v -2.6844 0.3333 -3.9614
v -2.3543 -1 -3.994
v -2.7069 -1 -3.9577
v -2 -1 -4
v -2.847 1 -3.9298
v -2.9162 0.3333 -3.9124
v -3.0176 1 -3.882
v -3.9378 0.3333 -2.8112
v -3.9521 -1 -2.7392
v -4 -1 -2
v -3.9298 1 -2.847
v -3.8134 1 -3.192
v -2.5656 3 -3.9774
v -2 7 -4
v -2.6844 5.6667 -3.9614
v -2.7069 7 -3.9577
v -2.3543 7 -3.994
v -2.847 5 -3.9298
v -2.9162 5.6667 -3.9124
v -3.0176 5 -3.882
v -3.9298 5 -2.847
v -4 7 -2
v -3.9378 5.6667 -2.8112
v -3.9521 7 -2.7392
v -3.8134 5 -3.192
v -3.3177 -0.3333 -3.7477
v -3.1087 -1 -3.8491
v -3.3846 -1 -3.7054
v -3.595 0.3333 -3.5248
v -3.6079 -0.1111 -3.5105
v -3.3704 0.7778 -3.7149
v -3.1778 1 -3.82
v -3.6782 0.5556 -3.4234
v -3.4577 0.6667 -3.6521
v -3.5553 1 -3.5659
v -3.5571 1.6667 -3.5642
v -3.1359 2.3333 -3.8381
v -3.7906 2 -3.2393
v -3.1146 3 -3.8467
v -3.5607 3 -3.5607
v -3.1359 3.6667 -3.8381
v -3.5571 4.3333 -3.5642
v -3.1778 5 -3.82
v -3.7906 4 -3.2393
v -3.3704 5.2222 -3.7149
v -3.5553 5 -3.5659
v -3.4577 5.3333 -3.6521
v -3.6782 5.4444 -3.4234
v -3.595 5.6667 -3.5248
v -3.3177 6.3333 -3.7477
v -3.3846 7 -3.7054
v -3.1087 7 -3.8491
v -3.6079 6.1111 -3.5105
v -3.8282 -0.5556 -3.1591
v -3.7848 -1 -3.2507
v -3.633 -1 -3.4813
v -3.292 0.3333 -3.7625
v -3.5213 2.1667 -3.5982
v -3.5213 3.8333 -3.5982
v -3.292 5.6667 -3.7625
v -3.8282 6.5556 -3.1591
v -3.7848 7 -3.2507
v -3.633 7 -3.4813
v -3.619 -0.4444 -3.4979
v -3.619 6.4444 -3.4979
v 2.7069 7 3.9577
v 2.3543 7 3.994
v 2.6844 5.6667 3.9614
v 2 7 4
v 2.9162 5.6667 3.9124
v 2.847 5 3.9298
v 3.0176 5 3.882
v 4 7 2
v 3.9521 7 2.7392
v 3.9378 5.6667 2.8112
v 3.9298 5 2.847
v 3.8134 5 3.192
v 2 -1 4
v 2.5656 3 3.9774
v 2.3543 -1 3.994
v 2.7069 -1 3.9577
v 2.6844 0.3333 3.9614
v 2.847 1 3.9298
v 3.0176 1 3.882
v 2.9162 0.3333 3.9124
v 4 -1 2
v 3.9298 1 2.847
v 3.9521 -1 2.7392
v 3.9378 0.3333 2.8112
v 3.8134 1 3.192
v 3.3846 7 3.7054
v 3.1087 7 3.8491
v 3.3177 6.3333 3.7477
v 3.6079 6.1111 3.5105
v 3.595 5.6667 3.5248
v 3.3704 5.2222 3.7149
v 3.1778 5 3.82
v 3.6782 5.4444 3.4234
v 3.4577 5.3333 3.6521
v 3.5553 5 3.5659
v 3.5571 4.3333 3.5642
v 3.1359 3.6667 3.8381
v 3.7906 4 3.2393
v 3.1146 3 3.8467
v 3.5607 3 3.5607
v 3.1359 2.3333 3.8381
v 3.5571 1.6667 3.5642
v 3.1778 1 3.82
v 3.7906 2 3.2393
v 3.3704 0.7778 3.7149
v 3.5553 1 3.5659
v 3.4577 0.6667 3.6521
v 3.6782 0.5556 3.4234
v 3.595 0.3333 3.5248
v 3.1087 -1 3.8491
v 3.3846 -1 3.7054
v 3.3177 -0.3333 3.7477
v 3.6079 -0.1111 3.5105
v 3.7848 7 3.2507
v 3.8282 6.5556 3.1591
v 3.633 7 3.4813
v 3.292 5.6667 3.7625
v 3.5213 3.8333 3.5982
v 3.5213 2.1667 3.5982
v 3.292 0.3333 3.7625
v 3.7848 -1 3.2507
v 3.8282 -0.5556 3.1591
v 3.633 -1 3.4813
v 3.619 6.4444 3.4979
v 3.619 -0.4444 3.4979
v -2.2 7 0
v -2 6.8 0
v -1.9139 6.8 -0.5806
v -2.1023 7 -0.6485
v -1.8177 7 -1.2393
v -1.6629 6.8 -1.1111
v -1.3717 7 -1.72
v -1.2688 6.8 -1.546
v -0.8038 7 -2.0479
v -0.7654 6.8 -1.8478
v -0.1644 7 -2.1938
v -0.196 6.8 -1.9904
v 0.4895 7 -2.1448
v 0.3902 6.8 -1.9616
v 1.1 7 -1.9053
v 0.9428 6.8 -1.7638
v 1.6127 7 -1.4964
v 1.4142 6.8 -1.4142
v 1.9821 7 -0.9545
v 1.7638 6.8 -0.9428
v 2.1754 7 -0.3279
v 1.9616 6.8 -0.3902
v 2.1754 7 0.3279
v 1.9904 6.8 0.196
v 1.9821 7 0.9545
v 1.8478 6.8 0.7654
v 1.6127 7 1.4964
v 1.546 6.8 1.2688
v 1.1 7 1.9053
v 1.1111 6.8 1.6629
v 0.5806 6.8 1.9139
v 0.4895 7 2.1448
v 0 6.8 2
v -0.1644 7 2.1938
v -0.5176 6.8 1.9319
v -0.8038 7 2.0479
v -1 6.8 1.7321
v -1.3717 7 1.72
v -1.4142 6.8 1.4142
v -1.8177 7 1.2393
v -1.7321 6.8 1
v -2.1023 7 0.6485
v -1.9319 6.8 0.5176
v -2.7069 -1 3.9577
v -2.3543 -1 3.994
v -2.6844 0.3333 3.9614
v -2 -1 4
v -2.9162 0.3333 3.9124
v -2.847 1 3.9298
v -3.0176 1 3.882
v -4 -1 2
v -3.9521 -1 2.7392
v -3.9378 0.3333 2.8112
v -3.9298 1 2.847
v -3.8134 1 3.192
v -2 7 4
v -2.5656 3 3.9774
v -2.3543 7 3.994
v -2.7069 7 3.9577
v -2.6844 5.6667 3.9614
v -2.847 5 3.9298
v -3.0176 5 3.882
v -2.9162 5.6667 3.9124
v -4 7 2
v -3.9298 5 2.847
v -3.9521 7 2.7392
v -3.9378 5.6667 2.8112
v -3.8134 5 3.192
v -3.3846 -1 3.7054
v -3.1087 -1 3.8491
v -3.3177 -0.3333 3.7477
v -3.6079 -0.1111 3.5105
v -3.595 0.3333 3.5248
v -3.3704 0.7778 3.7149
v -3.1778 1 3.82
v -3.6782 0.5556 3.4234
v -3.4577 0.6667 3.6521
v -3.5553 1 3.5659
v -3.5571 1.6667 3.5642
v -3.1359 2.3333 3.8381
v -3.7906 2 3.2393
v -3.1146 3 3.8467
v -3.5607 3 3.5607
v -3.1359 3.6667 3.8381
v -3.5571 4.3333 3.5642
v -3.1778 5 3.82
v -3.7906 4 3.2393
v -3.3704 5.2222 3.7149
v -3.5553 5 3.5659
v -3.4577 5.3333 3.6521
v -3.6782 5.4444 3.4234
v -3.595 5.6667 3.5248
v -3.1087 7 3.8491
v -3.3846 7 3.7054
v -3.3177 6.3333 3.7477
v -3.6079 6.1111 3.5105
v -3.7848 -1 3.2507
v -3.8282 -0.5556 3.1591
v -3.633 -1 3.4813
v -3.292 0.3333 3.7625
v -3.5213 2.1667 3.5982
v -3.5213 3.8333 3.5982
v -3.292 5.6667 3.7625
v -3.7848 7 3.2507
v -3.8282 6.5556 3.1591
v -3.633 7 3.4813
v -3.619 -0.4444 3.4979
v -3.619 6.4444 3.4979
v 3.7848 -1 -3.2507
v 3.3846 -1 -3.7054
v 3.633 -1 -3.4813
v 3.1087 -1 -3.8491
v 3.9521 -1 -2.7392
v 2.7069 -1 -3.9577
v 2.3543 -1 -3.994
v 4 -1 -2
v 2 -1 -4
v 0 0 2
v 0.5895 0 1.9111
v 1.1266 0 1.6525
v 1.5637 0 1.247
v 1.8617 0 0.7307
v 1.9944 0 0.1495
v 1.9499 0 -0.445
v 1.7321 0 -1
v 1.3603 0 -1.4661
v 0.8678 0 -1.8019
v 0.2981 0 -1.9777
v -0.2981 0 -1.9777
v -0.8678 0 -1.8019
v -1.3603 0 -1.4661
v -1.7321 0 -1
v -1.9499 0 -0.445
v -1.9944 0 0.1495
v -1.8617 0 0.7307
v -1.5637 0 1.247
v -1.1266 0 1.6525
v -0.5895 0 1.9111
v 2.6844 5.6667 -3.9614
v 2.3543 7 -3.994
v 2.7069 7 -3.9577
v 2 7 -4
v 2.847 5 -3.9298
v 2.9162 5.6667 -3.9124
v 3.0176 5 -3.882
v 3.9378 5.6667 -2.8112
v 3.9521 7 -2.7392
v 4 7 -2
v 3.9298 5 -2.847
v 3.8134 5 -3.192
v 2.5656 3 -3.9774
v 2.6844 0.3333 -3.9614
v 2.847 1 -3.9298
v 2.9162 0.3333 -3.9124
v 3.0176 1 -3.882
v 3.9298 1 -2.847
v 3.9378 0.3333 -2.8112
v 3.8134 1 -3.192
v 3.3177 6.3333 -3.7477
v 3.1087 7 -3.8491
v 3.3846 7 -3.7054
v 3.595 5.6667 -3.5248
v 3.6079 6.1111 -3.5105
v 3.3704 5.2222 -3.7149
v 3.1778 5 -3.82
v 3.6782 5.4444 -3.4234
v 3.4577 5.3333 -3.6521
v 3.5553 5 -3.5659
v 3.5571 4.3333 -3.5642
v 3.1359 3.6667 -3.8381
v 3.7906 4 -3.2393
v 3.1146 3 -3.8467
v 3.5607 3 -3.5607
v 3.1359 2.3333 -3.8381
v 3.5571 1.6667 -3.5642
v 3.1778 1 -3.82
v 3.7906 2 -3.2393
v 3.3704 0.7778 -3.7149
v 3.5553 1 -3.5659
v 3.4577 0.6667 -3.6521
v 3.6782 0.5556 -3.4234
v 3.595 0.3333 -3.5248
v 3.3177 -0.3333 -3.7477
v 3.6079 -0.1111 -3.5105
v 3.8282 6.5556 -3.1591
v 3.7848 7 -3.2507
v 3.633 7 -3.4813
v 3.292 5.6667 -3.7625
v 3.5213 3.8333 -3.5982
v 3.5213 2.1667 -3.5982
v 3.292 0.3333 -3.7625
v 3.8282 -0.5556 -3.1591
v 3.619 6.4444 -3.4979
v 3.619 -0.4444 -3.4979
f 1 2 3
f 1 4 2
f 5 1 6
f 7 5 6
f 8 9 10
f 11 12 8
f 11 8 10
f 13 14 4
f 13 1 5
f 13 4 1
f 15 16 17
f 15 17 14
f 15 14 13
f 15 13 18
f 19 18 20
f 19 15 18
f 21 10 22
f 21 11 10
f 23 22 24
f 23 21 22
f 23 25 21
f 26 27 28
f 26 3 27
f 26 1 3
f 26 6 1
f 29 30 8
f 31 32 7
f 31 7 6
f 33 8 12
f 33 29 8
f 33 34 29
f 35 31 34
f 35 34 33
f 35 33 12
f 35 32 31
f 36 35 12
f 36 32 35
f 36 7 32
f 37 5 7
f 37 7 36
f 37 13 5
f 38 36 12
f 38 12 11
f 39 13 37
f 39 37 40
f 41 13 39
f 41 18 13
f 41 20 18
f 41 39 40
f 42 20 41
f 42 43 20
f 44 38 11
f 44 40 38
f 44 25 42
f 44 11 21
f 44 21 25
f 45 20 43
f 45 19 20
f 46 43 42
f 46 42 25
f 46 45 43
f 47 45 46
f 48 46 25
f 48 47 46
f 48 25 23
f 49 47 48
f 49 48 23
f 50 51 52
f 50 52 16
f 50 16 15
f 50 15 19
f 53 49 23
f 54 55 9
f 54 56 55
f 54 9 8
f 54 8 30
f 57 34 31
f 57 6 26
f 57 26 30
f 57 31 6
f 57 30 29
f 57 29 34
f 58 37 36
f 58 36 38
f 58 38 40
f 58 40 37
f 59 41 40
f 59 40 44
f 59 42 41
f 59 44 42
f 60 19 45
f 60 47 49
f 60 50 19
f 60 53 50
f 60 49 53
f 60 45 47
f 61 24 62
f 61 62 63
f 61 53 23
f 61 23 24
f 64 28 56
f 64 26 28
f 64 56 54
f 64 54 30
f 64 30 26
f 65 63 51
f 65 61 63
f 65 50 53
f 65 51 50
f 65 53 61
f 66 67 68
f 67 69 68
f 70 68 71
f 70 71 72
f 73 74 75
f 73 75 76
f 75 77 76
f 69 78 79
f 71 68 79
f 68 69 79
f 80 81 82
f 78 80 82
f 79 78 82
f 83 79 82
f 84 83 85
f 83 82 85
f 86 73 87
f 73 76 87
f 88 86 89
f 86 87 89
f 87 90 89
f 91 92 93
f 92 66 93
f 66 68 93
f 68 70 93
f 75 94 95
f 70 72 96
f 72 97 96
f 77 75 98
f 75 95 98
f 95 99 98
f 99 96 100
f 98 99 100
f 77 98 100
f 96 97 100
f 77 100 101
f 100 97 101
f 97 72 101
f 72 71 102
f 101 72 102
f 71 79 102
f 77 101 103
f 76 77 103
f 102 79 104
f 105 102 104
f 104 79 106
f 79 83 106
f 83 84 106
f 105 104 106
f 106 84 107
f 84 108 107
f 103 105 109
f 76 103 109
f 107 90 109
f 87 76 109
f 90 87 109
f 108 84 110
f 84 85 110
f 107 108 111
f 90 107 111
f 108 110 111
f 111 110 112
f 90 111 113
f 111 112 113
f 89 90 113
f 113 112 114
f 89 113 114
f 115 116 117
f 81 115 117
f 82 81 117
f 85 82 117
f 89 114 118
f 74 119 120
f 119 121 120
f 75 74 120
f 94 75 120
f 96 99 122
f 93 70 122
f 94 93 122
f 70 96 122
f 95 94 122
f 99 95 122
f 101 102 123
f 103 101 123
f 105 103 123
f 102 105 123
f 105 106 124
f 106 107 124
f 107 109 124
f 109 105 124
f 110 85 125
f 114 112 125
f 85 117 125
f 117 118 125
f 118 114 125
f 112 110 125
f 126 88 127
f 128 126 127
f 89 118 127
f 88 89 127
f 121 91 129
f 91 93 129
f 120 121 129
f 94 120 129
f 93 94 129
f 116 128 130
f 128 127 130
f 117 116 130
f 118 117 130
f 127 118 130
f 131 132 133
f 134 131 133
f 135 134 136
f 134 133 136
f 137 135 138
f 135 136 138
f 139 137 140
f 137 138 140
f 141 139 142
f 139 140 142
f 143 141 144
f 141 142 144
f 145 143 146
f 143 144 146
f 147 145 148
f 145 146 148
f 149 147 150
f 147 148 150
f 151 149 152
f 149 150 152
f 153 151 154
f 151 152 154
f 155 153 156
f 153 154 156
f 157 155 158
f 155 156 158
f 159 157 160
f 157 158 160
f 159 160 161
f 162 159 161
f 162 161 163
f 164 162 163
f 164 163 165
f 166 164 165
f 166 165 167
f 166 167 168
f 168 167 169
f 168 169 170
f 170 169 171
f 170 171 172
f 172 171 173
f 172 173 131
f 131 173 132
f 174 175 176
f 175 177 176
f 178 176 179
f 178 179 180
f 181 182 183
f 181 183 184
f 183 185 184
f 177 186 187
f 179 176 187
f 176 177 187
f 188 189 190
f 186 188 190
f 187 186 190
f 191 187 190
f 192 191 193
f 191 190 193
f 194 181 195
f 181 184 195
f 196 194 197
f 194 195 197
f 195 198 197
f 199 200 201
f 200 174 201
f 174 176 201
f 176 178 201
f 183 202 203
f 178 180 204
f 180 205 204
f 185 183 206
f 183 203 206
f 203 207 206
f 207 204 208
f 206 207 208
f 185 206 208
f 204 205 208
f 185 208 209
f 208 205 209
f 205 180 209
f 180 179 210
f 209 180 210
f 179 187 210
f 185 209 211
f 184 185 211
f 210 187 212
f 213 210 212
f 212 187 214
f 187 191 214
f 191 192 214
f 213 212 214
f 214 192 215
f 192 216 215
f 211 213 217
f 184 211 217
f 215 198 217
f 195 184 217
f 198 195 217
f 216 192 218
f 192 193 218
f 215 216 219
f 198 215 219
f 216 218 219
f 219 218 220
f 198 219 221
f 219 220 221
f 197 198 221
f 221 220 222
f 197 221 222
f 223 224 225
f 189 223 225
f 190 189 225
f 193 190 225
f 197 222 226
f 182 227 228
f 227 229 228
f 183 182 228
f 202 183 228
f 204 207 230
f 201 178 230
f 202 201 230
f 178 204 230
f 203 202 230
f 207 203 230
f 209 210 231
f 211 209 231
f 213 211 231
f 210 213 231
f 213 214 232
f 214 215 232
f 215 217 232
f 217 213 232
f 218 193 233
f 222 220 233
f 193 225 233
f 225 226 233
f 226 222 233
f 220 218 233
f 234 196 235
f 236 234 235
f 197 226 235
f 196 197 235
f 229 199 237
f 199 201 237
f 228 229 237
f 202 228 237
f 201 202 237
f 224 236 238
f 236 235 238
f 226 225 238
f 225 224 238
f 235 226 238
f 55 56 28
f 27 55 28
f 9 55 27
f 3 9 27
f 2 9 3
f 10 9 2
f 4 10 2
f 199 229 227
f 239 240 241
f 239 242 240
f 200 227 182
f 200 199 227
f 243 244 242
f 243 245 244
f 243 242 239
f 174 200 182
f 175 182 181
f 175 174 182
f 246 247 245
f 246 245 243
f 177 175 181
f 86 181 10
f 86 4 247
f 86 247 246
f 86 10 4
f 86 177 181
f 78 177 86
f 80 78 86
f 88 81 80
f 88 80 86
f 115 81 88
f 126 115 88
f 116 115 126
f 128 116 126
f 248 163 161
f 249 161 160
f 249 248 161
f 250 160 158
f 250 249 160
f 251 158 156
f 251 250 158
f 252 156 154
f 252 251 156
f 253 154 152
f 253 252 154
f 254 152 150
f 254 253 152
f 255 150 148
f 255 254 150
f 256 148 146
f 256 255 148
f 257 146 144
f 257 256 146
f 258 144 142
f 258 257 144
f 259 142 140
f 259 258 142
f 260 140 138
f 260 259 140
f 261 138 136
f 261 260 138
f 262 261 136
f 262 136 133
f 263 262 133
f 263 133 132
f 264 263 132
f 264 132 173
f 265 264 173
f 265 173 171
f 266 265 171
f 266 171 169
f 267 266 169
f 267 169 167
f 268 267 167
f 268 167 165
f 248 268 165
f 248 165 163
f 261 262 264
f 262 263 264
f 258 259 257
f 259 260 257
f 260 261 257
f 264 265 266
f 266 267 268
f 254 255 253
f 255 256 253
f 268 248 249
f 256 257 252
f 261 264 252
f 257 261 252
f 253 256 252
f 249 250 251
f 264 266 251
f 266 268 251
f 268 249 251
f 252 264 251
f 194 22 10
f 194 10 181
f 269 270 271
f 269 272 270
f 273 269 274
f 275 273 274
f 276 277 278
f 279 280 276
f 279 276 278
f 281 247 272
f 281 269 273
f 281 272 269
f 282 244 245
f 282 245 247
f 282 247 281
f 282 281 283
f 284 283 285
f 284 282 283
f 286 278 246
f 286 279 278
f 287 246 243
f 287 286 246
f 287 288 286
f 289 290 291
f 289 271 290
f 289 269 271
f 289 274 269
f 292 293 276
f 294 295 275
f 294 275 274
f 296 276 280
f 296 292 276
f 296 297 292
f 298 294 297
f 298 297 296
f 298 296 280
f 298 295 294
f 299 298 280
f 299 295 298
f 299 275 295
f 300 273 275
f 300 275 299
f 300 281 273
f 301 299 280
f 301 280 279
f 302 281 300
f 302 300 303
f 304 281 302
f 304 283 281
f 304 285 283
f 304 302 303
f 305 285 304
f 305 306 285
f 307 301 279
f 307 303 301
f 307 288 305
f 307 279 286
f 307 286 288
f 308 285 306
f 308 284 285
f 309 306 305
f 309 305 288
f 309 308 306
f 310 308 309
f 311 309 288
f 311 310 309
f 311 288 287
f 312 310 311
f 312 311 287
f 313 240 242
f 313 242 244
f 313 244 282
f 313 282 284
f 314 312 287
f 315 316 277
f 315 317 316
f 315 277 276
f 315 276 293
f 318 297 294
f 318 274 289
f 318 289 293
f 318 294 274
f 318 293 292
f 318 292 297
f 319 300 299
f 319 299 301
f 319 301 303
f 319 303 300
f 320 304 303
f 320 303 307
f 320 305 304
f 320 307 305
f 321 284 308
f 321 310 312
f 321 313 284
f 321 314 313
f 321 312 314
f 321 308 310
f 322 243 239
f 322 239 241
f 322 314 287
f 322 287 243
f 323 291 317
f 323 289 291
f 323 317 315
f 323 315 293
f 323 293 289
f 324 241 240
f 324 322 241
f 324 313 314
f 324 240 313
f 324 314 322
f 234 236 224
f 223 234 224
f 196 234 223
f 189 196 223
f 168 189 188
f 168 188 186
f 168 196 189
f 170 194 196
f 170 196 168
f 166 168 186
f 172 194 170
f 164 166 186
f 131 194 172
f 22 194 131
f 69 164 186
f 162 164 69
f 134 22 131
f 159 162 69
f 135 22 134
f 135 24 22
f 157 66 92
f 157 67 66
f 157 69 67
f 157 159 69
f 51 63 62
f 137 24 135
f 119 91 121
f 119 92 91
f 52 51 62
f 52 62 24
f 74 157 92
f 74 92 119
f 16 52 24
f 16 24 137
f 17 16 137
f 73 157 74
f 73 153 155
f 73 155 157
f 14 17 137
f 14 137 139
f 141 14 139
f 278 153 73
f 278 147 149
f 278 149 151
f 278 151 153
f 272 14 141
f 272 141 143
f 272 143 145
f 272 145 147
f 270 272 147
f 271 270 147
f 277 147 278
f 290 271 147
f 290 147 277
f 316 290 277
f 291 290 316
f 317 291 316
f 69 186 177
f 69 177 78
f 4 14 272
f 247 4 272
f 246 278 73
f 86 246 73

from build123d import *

# Parameters (mm, degrees)
SKETCH2_W                                       = 8
SKETCH2_H                                       = 8
SKETCH2_R                                       = 2
BOSS_EXTRUDE1_DEPTH                             = 7
SKETCH3_W                                       = 8
SKETCH3_H                                       = 8
BOSS_EXTRUDE2_DEPTH                             = 1
FILLET1_SIZE                                    = 2
CSK_FOR_M2_FLAT_HEAD_MACHINE_SCREW1_D           = 2.4
CSK_FOR_M2_FLAT_HEAD_MACHINE_SCREW1_DEPTH       = 7
CSK_FOR_M2_FLAT_HEAD_MACHINE_SCREW1_CSINK_D     = 4.4
CSK_FOR_M2_FLAT_HEAD_MACHINE_SCREW1_CSINK_ANGLE = 90


with BuildPart() as part:
    # Sketch2 → Boss-Extrude1 (new body)
    with BuildSketch(Plane(origin=(0, 0, 0), x_dir=(1, 0, 0), z_dir=(0, 1, 0))):
        Rectangle(SKETCH2_W, SKETCH2_H)
        with Locations(Location((0, 0, 0), (0, 0, 270))):
            Circle(SKETCH2_R, mode=Mode.SUBTRACT)
    extrude(amount=BOSS_EXTRUDE1_DEPTH)

    # Sketch3 → Boss-Extrude2 (add)
    with BuildSketch(Plane.XZ):
        Rectangle(SKETCH3_W, SKETCH3_H)
    extrude(amount=BOSS_EXTRUDE2_DEPTH)

    # Fillet1
    # a fillet whose section is not a circle: 2 mm, written as the material it takes off along each edge
    with BuildSketch(Plane(origin=(4, -6, 4), x_dir=(-1, 0, 0), z_dir=(0, 1, 0)), Plane(origin=(-4, 12, 4), x_dir=(1, 0, 0), z_dir=(0, -1, 0))) as fillet1_piece_1:
        with BuildLine():
            add(Edge.make_bspline([(FILLET1_SIZE, 0), (FILLET1_SIZE * 0.831801948466, 0), (FILLET1_SIZE * 0.663603896932, 0), (FILLET1_SIZE * 0.292893218813, -FILLET1_SIZE * 0.0716919198361), (FILLET1_SIZE * 0.0716919198361, -FILLET1_SIZE * 0.292893218813), (0, -FILLET1_SIZE * 0.663603896932), (0, -FILLET1_SIZE * 0.831801948466), (0, -FILLET1_SIZE)], knots=[0, 0, 0, 0, 0, 0, 0.5, 0.5, 1, 1, 1, 1, 1, 1], degree=5))
            Line((0, -FILLET1_SIZE), (0, 0))
            Line((0, 0), (FILLET1_SIZE, 0))
        make_face()
    extrude(amount=18, mode=Mode.SUBTRACT)
    with BuildSketch(Plane(origin=(-4, 12, -4), x_dir=(1, 0, 0), z_dir=(0, -1, 0)), Plane(origin=(4, -6, -4), x_dir=(-1, 0, 0), z_dir=(0, 1, 0))) as fillet1_piece_2:
        with BuildLine():
            add(Edge.make_bspline([(FILLET1_SIZE, 0), (FILLET1_SIZE * 0.831801948466, 0), (FILLET1_SIZE * 0.663603896932, 0), (FILLET1_SIZE * 0.292893218813, FILLET1_SIZE * 0.0716919198361), (FILLET1_SIZE * 0.0716919198361, FILLET1_SIZE * 0.292893218813), (0, FILLET1_SIZE * 0.663603896932), (0, FILLET1_SIZE * 0.831801948466), (0, FILLET1_SIZE)], knots=[0, 0, 0, 0, 0, 0, 0.5, 0.5, 1, 1, 1, 1, 1, 1], degree=5))
            Line((0, FILLET1_SIZE), (0, 0))
            Line((0, 0), (FILLET1_SIZE, 0))
        make_face()
    extrude(amount=18, mode=Mode.SUBTRACT)

    # CSK for M2 Flat Head Machine Screw1
    with Locations(Plane(origin=(0, 7, 0), x_dir=(1, 0, 0), z_dir=(0, 1, 0))):
        with Locations((0, 0)):
            CounterSinkHole(CSK_FOR_M2_FLAT_HEAD_MACHINE_SCREW1_D / 2, CSK_FOR_M2_FLAT_HEAD_MACHINE_SCREW1_CSINK_D / 2, depth=CSK_FOR_M2_FLAT_HEAD_MACHINE_SCREW1_DEPTH, counter_sink_angle=CSK_FOR_M2_FLAT_HEAD_MACHINE_SCREW1_CSINK_ANGLE)


solid = part.part
